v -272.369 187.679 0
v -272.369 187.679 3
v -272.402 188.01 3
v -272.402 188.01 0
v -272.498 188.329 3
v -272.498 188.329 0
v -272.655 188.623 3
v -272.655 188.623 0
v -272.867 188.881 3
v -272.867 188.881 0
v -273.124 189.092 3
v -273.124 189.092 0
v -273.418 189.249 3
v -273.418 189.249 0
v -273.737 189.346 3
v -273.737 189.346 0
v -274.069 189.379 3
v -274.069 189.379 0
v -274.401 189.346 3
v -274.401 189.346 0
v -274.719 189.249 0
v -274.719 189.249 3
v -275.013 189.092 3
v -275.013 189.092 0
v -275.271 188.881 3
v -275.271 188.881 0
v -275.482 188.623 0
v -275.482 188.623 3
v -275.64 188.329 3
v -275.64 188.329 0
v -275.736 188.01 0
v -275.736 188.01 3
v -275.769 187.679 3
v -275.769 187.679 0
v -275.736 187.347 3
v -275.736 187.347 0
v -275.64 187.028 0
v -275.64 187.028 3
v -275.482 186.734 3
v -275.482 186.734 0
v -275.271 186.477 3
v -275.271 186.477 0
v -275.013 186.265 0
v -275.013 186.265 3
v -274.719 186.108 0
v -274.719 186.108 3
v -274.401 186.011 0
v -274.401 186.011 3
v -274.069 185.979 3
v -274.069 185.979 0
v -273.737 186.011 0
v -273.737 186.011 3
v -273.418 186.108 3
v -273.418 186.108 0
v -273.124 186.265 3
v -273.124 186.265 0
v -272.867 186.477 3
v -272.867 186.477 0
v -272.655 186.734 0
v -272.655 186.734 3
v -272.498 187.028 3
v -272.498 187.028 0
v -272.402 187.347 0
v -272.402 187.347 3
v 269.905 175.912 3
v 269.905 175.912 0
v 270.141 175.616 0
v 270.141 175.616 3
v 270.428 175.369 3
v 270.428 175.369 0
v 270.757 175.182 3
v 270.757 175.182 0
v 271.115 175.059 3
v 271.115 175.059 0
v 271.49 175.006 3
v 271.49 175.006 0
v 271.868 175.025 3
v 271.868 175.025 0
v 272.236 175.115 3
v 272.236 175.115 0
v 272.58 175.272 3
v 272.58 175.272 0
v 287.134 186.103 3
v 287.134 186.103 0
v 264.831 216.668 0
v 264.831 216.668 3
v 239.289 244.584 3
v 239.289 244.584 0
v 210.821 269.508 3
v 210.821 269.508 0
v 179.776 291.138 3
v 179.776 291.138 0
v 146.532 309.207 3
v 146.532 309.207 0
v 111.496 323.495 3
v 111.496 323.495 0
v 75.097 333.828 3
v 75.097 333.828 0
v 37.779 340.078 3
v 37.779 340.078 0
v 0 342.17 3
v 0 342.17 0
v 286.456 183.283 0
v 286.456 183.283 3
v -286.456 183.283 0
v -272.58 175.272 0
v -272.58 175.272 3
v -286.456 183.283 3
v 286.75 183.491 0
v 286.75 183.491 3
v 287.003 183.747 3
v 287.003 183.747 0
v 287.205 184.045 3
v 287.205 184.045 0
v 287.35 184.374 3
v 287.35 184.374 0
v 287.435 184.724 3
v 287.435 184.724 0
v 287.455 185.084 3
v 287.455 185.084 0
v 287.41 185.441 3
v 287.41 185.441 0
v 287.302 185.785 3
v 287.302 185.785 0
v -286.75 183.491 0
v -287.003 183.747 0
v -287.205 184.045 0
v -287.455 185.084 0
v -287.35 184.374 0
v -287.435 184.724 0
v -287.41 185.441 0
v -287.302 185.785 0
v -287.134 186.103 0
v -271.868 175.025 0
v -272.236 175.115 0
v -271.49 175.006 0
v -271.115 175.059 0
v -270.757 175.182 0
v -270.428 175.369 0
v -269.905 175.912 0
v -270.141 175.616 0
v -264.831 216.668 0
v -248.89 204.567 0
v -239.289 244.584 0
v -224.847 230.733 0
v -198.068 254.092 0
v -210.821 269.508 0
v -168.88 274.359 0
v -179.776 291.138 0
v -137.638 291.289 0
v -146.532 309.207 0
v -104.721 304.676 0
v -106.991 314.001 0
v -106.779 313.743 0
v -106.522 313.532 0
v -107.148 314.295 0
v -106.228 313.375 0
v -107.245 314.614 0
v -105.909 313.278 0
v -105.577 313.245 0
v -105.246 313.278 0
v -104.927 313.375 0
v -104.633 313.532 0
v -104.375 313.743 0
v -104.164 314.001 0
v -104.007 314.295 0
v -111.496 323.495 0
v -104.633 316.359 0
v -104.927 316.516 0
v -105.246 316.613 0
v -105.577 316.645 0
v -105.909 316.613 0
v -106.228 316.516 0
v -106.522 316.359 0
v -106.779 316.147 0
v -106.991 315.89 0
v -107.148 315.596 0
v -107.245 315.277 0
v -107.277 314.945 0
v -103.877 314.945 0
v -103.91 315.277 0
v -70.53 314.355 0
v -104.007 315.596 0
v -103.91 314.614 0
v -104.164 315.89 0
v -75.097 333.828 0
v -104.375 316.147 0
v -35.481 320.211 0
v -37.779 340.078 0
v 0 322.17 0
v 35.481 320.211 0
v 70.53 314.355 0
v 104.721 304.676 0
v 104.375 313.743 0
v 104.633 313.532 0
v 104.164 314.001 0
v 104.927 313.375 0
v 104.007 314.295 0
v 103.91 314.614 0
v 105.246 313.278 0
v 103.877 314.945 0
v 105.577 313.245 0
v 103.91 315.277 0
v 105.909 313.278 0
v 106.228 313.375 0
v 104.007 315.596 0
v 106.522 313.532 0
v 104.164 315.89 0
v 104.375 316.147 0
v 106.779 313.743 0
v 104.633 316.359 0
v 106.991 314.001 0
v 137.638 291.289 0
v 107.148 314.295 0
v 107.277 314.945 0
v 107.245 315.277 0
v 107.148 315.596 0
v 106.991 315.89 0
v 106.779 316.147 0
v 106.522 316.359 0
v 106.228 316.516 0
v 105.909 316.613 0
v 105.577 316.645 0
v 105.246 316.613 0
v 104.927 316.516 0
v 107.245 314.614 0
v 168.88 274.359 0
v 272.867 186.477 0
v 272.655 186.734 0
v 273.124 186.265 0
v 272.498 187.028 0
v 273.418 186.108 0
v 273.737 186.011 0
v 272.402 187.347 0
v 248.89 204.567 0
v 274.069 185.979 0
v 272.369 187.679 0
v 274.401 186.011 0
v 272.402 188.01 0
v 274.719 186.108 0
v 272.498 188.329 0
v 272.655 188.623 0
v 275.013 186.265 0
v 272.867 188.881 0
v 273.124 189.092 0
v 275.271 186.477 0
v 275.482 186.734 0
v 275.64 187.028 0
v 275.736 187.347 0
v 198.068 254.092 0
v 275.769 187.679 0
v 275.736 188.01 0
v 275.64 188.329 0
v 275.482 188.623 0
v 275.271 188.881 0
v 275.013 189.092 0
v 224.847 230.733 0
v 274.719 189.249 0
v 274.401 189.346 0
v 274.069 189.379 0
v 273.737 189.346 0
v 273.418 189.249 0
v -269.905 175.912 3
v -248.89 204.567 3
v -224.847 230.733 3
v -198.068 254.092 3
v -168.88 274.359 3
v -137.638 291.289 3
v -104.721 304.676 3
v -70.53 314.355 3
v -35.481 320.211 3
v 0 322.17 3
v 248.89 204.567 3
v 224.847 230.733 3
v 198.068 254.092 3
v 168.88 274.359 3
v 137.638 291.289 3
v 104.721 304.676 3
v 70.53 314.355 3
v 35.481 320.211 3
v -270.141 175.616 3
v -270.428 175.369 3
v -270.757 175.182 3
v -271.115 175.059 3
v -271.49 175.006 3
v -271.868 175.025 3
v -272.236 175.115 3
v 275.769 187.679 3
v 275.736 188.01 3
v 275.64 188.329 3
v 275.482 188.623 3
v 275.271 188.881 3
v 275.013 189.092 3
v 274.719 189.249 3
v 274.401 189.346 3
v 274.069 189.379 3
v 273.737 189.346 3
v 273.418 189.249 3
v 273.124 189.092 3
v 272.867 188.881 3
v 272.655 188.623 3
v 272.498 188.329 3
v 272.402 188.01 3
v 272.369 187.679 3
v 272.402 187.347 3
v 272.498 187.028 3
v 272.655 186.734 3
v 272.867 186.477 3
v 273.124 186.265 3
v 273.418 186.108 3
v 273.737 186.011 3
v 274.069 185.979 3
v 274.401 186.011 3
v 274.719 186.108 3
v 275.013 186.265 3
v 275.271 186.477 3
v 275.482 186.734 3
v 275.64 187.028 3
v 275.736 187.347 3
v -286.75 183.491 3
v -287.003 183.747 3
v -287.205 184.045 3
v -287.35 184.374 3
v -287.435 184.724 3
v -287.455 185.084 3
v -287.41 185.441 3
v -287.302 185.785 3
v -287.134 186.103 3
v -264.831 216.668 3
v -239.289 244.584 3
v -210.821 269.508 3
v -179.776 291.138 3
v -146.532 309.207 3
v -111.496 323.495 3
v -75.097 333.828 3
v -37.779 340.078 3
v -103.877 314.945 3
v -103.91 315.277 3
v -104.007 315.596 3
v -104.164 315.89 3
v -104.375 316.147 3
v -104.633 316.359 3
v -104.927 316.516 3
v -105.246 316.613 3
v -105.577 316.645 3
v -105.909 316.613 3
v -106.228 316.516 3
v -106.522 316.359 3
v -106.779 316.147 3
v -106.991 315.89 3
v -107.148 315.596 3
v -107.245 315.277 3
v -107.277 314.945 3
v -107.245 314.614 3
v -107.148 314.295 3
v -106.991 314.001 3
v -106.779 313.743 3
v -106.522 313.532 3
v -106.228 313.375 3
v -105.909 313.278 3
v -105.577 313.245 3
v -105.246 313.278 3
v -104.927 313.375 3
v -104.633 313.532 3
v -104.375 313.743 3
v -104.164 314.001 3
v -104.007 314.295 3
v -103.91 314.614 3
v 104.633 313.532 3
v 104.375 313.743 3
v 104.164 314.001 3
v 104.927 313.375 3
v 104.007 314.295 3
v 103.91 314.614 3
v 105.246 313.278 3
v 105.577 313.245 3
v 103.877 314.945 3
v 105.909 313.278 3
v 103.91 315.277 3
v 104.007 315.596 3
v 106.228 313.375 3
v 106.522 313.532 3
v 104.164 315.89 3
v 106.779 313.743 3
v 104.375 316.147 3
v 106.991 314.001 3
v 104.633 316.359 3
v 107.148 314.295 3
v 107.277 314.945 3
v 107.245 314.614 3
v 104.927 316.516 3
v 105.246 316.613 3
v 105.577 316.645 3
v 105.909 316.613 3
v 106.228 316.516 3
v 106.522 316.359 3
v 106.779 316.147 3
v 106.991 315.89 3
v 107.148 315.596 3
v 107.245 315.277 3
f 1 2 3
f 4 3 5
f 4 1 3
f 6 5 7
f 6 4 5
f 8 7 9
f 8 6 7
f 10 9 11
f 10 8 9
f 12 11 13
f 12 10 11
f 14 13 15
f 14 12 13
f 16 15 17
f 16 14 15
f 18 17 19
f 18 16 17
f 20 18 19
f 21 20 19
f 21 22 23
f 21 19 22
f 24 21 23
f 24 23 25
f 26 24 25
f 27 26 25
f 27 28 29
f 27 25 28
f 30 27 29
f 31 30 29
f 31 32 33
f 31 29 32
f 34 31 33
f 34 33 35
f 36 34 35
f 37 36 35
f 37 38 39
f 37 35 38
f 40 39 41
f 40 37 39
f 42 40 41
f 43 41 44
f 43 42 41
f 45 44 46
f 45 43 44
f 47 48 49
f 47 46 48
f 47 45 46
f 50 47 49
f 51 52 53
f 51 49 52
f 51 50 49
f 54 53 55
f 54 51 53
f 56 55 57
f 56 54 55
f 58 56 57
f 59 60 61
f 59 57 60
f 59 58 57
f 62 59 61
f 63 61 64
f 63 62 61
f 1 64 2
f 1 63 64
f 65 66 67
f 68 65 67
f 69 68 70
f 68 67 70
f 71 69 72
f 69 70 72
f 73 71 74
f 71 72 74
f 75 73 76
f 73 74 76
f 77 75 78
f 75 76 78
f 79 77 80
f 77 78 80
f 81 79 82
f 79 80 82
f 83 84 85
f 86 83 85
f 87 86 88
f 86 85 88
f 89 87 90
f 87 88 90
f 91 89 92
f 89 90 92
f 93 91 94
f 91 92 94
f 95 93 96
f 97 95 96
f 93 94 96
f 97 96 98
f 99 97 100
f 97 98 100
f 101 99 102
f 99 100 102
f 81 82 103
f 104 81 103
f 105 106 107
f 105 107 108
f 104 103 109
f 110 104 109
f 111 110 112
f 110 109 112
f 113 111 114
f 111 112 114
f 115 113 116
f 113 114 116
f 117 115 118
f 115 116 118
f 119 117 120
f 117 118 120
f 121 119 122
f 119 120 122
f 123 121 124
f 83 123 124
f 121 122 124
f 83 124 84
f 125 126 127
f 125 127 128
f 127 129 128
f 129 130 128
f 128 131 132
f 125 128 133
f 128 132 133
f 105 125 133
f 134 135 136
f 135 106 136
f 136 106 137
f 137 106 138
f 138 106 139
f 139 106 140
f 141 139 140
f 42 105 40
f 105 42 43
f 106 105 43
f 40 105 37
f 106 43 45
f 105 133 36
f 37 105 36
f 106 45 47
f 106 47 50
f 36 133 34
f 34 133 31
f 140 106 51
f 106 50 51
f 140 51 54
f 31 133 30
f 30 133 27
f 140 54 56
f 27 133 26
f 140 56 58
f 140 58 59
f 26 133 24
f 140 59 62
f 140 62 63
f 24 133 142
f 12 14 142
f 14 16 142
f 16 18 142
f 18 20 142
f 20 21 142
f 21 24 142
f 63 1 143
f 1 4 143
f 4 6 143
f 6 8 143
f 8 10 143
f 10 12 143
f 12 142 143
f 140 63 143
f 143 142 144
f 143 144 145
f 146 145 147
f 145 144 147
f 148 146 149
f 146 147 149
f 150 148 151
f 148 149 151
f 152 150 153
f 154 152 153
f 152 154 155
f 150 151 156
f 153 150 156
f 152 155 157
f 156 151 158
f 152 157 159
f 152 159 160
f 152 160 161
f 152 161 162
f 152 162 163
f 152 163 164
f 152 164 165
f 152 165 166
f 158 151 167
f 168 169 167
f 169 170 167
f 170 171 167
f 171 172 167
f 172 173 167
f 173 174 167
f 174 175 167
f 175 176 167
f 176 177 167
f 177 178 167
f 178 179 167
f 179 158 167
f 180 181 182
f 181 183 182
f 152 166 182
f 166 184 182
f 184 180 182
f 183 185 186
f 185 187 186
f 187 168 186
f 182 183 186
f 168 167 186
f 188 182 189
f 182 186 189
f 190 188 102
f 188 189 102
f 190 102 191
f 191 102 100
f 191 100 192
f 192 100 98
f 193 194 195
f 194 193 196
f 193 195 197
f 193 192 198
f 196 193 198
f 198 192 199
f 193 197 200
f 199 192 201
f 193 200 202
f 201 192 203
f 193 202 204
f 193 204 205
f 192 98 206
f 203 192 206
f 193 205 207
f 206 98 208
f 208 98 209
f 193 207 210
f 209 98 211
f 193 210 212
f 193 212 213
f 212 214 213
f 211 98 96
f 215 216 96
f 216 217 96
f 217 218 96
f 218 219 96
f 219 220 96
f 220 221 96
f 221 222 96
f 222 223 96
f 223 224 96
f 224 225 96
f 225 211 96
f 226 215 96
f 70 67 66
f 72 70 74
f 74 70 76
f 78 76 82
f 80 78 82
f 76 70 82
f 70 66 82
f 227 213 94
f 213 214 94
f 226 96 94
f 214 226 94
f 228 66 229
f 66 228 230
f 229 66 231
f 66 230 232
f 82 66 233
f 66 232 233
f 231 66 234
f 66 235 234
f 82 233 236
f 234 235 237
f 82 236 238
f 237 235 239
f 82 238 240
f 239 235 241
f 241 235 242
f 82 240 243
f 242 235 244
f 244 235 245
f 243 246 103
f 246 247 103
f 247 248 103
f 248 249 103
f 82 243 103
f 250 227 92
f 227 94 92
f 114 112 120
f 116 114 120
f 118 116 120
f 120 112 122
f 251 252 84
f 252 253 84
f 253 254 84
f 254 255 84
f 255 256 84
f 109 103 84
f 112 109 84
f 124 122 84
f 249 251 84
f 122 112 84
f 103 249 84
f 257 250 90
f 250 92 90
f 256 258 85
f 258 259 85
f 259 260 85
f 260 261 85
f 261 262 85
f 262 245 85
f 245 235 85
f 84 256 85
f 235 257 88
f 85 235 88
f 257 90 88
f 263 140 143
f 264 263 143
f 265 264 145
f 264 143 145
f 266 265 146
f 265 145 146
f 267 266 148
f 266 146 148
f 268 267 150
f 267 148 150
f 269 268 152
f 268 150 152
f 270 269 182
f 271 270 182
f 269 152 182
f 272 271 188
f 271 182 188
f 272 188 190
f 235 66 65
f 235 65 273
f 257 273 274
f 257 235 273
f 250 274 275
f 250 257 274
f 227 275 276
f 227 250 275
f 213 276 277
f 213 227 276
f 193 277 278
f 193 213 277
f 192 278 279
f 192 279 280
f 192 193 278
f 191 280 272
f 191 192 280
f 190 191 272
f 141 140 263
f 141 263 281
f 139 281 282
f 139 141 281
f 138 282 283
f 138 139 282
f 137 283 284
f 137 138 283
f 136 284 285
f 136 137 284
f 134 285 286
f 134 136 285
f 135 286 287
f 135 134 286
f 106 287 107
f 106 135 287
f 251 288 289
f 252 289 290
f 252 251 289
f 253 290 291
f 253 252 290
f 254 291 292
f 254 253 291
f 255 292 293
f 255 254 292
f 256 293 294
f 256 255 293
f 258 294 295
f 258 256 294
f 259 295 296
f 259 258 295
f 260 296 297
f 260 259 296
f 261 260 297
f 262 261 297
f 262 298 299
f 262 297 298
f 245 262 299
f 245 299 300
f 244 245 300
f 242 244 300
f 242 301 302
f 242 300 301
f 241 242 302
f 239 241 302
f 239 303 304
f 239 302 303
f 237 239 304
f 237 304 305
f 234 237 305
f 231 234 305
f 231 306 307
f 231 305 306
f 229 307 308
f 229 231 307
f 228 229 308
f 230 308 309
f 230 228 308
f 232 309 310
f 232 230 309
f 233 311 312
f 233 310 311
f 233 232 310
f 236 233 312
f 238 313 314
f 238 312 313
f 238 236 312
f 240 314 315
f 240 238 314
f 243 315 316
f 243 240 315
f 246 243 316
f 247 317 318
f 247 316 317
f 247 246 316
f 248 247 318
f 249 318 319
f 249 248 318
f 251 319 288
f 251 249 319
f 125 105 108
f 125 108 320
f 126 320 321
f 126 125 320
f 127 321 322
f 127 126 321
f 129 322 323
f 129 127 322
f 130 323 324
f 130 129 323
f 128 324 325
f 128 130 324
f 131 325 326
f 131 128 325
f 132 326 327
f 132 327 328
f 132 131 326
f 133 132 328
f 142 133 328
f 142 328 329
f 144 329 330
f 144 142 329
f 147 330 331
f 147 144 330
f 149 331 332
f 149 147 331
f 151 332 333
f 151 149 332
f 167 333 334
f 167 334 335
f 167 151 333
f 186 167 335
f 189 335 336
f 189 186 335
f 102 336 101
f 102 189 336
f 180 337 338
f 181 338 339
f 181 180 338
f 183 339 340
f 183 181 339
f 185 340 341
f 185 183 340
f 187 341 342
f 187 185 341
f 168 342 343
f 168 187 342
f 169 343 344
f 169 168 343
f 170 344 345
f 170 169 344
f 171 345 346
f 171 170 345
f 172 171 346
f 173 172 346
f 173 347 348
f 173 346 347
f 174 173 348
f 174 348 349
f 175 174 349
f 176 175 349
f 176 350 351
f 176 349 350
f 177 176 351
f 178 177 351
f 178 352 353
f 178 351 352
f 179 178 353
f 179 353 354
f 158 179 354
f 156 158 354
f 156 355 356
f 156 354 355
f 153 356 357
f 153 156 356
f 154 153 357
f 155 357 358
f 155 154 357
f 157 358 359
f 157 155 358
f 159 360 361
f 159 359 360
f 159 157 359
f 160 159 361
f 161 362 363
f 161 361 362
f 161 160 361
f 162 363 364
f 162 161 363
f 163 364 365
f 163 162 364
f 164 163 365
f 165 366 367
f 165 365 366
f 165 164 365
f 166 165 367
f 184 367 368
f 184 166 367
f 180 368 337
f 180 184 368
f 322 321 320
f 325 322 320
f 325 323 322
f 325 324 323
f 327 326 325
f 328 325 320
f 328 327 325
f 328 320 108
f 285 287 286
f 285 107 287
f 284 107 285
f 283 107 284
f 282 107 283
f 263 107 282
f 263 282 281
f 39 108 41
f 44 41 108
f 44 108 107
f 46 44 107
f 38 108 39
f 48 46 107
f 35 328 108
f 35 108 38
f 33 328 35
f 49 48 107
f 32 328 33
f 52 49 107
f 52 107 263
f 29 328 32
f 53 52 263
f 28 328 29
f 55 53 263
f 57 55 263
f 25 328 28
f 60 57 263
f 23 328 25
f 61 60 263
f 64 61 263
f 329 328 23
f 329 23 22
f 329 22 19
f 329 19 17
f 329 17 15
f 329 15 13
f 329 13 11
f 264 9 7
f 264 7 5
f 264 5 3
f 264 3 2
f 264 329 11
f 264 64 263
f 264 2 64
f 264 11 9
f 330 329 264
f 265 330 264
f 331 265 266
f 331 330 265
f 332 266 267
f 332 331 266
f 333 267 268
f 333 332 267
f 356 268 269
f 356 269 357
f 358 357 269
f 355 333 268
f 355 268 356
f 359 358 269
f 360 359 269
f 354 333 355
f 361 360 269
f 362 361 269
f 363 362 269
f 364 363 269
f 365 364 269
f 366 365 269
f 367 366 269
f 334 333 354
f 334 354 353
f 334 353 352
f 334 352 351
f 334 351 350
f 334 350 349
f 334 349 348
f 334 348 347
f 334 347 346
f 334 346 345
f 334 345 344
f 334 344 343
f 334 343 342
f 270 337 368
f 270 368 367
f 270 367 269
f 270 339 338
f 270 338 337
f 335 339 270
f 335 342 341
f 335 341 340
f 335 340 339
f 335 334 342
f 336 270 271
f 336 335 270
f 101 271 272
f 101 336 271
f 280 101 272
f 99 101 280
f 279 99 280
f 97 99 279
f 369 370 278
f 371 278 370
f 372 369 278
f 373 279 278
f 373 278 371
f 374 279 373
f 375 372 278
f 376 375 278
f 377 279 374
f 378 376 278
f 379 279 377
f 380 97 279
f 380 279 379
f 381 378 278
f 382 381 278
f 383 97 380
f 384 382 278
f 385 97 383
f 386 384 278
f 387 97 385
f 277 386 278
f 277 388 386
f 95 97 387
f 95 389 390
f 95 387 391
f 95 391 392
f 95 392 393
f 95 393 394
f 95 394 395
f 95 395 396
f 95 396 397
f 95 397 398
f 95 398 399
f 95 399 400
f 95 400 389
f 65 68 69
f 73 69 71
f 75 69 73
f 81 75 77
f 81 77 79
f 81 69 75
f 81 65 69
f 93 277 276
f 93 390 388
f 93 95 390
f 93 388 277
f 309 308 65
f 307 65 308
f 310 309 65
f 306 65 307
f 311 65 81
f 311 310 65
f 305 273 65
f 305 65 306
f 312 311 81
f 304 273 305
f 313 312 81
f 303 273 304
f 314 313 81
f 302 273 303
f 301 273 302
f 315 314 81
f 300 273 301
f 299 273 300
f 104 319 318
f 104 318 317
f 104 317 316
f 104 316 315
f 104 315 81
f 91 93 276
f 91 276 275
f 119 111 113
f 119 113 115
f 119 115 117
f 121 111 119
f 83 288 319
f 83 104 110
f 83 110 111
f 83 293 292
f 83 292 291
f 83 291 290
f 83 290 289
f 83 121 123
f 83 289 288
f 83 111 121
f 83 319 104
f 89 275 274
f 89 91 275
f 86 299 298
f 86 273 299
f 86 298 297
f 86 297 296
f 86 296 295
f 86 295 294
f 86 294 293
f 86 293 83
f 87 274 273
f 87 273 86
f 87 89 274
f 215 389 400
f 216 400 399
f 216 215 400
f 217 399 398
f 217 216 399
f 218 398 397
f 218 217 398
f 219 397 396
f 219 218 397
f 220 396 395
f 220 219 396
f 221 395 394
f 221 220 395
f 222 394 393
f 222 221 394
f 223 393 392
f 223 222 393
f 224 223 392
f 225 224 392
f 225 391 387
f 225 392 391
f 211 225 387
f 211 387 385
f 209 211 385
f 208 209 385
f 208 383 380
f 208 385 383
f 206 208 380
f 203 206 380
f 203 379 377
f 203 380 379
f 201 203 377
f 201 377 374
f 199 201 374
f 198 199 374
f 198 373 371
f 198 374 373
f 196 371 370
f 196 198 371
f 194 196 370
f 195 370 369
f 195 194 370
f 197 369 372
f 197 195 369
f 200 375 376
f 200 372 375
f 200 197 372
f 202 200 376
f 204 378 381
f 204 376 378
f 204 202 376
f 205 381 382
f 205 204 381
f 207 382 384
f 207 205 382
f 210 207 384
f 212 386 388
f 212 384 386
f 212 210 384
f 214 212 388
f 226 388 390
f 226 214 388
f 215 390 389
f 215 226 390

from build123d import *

# Parameters (mm, degrees)
PAD005_DEPTH         = 3
SKETCH058_R          = 1.7
POCKET029_DEPTH      = 0.001
POCKET029_DEPTH_BACK = 3.001


with BuildPart() as part:
    # Sketch057 → Pad005 (new body)
    with BuildSketch(Plane.XY):
        with BuildLine():
            ThreePointArc((269.904723, 175.912153), (153.492654, 283.255451), (0, 322.170212))
            Line((0, 322.170212), (0, 342.170212))
            ThreePointArc((287.134265, 186.103111), (163.403661, 300.632163), (0, 342.170212))
            ThreePointArc((286.455952, 183.283279), (287.400483, 184.547572), (287.134265, 186.103111))
            Line((272.580264, 175.272147), (286.455952, 183.283279))
            ThreePointArc((269.904723, 175.912153), (271.114979, 175.059074), (272.580264, 175.272147))
        make_face()
    pad005 = extrude(amount=PAD005_DEPTH)

    # Mirrored011: Pad005 across Sketch057 V_Axis
    add(pad005.mirror(Plane(origin=(0, 0, 0), x_dir=(0, 0, 1), z_dir=(1, 0, 0))))

    # Sketch058 → Pocket029 (cut, two sides)
    with BuildSketch(Plane.XY) as pocket029_sk:
        with Locations((105.577257, 314.945221)):
            Circle(SKETCH058_R)
        with Locations((274.068932, 187.678635)):
            Circle(SKETCH058_R)
        with Locations((-105.577257, 314.945221)):
            Circle(SKETCH058_R)
        with Locations((-274.068932, 187.678635)):
            Circle(SKETCH058_R)
    extrude(amount=-POCKET029_DEPTH, mode=Mode.SUBTRACT)
    extrude(pocket029_sk.sketch, amount=POCKET029_DEPTH_BACK, mode=Mode.SUBTRACT)


solid = part.part
